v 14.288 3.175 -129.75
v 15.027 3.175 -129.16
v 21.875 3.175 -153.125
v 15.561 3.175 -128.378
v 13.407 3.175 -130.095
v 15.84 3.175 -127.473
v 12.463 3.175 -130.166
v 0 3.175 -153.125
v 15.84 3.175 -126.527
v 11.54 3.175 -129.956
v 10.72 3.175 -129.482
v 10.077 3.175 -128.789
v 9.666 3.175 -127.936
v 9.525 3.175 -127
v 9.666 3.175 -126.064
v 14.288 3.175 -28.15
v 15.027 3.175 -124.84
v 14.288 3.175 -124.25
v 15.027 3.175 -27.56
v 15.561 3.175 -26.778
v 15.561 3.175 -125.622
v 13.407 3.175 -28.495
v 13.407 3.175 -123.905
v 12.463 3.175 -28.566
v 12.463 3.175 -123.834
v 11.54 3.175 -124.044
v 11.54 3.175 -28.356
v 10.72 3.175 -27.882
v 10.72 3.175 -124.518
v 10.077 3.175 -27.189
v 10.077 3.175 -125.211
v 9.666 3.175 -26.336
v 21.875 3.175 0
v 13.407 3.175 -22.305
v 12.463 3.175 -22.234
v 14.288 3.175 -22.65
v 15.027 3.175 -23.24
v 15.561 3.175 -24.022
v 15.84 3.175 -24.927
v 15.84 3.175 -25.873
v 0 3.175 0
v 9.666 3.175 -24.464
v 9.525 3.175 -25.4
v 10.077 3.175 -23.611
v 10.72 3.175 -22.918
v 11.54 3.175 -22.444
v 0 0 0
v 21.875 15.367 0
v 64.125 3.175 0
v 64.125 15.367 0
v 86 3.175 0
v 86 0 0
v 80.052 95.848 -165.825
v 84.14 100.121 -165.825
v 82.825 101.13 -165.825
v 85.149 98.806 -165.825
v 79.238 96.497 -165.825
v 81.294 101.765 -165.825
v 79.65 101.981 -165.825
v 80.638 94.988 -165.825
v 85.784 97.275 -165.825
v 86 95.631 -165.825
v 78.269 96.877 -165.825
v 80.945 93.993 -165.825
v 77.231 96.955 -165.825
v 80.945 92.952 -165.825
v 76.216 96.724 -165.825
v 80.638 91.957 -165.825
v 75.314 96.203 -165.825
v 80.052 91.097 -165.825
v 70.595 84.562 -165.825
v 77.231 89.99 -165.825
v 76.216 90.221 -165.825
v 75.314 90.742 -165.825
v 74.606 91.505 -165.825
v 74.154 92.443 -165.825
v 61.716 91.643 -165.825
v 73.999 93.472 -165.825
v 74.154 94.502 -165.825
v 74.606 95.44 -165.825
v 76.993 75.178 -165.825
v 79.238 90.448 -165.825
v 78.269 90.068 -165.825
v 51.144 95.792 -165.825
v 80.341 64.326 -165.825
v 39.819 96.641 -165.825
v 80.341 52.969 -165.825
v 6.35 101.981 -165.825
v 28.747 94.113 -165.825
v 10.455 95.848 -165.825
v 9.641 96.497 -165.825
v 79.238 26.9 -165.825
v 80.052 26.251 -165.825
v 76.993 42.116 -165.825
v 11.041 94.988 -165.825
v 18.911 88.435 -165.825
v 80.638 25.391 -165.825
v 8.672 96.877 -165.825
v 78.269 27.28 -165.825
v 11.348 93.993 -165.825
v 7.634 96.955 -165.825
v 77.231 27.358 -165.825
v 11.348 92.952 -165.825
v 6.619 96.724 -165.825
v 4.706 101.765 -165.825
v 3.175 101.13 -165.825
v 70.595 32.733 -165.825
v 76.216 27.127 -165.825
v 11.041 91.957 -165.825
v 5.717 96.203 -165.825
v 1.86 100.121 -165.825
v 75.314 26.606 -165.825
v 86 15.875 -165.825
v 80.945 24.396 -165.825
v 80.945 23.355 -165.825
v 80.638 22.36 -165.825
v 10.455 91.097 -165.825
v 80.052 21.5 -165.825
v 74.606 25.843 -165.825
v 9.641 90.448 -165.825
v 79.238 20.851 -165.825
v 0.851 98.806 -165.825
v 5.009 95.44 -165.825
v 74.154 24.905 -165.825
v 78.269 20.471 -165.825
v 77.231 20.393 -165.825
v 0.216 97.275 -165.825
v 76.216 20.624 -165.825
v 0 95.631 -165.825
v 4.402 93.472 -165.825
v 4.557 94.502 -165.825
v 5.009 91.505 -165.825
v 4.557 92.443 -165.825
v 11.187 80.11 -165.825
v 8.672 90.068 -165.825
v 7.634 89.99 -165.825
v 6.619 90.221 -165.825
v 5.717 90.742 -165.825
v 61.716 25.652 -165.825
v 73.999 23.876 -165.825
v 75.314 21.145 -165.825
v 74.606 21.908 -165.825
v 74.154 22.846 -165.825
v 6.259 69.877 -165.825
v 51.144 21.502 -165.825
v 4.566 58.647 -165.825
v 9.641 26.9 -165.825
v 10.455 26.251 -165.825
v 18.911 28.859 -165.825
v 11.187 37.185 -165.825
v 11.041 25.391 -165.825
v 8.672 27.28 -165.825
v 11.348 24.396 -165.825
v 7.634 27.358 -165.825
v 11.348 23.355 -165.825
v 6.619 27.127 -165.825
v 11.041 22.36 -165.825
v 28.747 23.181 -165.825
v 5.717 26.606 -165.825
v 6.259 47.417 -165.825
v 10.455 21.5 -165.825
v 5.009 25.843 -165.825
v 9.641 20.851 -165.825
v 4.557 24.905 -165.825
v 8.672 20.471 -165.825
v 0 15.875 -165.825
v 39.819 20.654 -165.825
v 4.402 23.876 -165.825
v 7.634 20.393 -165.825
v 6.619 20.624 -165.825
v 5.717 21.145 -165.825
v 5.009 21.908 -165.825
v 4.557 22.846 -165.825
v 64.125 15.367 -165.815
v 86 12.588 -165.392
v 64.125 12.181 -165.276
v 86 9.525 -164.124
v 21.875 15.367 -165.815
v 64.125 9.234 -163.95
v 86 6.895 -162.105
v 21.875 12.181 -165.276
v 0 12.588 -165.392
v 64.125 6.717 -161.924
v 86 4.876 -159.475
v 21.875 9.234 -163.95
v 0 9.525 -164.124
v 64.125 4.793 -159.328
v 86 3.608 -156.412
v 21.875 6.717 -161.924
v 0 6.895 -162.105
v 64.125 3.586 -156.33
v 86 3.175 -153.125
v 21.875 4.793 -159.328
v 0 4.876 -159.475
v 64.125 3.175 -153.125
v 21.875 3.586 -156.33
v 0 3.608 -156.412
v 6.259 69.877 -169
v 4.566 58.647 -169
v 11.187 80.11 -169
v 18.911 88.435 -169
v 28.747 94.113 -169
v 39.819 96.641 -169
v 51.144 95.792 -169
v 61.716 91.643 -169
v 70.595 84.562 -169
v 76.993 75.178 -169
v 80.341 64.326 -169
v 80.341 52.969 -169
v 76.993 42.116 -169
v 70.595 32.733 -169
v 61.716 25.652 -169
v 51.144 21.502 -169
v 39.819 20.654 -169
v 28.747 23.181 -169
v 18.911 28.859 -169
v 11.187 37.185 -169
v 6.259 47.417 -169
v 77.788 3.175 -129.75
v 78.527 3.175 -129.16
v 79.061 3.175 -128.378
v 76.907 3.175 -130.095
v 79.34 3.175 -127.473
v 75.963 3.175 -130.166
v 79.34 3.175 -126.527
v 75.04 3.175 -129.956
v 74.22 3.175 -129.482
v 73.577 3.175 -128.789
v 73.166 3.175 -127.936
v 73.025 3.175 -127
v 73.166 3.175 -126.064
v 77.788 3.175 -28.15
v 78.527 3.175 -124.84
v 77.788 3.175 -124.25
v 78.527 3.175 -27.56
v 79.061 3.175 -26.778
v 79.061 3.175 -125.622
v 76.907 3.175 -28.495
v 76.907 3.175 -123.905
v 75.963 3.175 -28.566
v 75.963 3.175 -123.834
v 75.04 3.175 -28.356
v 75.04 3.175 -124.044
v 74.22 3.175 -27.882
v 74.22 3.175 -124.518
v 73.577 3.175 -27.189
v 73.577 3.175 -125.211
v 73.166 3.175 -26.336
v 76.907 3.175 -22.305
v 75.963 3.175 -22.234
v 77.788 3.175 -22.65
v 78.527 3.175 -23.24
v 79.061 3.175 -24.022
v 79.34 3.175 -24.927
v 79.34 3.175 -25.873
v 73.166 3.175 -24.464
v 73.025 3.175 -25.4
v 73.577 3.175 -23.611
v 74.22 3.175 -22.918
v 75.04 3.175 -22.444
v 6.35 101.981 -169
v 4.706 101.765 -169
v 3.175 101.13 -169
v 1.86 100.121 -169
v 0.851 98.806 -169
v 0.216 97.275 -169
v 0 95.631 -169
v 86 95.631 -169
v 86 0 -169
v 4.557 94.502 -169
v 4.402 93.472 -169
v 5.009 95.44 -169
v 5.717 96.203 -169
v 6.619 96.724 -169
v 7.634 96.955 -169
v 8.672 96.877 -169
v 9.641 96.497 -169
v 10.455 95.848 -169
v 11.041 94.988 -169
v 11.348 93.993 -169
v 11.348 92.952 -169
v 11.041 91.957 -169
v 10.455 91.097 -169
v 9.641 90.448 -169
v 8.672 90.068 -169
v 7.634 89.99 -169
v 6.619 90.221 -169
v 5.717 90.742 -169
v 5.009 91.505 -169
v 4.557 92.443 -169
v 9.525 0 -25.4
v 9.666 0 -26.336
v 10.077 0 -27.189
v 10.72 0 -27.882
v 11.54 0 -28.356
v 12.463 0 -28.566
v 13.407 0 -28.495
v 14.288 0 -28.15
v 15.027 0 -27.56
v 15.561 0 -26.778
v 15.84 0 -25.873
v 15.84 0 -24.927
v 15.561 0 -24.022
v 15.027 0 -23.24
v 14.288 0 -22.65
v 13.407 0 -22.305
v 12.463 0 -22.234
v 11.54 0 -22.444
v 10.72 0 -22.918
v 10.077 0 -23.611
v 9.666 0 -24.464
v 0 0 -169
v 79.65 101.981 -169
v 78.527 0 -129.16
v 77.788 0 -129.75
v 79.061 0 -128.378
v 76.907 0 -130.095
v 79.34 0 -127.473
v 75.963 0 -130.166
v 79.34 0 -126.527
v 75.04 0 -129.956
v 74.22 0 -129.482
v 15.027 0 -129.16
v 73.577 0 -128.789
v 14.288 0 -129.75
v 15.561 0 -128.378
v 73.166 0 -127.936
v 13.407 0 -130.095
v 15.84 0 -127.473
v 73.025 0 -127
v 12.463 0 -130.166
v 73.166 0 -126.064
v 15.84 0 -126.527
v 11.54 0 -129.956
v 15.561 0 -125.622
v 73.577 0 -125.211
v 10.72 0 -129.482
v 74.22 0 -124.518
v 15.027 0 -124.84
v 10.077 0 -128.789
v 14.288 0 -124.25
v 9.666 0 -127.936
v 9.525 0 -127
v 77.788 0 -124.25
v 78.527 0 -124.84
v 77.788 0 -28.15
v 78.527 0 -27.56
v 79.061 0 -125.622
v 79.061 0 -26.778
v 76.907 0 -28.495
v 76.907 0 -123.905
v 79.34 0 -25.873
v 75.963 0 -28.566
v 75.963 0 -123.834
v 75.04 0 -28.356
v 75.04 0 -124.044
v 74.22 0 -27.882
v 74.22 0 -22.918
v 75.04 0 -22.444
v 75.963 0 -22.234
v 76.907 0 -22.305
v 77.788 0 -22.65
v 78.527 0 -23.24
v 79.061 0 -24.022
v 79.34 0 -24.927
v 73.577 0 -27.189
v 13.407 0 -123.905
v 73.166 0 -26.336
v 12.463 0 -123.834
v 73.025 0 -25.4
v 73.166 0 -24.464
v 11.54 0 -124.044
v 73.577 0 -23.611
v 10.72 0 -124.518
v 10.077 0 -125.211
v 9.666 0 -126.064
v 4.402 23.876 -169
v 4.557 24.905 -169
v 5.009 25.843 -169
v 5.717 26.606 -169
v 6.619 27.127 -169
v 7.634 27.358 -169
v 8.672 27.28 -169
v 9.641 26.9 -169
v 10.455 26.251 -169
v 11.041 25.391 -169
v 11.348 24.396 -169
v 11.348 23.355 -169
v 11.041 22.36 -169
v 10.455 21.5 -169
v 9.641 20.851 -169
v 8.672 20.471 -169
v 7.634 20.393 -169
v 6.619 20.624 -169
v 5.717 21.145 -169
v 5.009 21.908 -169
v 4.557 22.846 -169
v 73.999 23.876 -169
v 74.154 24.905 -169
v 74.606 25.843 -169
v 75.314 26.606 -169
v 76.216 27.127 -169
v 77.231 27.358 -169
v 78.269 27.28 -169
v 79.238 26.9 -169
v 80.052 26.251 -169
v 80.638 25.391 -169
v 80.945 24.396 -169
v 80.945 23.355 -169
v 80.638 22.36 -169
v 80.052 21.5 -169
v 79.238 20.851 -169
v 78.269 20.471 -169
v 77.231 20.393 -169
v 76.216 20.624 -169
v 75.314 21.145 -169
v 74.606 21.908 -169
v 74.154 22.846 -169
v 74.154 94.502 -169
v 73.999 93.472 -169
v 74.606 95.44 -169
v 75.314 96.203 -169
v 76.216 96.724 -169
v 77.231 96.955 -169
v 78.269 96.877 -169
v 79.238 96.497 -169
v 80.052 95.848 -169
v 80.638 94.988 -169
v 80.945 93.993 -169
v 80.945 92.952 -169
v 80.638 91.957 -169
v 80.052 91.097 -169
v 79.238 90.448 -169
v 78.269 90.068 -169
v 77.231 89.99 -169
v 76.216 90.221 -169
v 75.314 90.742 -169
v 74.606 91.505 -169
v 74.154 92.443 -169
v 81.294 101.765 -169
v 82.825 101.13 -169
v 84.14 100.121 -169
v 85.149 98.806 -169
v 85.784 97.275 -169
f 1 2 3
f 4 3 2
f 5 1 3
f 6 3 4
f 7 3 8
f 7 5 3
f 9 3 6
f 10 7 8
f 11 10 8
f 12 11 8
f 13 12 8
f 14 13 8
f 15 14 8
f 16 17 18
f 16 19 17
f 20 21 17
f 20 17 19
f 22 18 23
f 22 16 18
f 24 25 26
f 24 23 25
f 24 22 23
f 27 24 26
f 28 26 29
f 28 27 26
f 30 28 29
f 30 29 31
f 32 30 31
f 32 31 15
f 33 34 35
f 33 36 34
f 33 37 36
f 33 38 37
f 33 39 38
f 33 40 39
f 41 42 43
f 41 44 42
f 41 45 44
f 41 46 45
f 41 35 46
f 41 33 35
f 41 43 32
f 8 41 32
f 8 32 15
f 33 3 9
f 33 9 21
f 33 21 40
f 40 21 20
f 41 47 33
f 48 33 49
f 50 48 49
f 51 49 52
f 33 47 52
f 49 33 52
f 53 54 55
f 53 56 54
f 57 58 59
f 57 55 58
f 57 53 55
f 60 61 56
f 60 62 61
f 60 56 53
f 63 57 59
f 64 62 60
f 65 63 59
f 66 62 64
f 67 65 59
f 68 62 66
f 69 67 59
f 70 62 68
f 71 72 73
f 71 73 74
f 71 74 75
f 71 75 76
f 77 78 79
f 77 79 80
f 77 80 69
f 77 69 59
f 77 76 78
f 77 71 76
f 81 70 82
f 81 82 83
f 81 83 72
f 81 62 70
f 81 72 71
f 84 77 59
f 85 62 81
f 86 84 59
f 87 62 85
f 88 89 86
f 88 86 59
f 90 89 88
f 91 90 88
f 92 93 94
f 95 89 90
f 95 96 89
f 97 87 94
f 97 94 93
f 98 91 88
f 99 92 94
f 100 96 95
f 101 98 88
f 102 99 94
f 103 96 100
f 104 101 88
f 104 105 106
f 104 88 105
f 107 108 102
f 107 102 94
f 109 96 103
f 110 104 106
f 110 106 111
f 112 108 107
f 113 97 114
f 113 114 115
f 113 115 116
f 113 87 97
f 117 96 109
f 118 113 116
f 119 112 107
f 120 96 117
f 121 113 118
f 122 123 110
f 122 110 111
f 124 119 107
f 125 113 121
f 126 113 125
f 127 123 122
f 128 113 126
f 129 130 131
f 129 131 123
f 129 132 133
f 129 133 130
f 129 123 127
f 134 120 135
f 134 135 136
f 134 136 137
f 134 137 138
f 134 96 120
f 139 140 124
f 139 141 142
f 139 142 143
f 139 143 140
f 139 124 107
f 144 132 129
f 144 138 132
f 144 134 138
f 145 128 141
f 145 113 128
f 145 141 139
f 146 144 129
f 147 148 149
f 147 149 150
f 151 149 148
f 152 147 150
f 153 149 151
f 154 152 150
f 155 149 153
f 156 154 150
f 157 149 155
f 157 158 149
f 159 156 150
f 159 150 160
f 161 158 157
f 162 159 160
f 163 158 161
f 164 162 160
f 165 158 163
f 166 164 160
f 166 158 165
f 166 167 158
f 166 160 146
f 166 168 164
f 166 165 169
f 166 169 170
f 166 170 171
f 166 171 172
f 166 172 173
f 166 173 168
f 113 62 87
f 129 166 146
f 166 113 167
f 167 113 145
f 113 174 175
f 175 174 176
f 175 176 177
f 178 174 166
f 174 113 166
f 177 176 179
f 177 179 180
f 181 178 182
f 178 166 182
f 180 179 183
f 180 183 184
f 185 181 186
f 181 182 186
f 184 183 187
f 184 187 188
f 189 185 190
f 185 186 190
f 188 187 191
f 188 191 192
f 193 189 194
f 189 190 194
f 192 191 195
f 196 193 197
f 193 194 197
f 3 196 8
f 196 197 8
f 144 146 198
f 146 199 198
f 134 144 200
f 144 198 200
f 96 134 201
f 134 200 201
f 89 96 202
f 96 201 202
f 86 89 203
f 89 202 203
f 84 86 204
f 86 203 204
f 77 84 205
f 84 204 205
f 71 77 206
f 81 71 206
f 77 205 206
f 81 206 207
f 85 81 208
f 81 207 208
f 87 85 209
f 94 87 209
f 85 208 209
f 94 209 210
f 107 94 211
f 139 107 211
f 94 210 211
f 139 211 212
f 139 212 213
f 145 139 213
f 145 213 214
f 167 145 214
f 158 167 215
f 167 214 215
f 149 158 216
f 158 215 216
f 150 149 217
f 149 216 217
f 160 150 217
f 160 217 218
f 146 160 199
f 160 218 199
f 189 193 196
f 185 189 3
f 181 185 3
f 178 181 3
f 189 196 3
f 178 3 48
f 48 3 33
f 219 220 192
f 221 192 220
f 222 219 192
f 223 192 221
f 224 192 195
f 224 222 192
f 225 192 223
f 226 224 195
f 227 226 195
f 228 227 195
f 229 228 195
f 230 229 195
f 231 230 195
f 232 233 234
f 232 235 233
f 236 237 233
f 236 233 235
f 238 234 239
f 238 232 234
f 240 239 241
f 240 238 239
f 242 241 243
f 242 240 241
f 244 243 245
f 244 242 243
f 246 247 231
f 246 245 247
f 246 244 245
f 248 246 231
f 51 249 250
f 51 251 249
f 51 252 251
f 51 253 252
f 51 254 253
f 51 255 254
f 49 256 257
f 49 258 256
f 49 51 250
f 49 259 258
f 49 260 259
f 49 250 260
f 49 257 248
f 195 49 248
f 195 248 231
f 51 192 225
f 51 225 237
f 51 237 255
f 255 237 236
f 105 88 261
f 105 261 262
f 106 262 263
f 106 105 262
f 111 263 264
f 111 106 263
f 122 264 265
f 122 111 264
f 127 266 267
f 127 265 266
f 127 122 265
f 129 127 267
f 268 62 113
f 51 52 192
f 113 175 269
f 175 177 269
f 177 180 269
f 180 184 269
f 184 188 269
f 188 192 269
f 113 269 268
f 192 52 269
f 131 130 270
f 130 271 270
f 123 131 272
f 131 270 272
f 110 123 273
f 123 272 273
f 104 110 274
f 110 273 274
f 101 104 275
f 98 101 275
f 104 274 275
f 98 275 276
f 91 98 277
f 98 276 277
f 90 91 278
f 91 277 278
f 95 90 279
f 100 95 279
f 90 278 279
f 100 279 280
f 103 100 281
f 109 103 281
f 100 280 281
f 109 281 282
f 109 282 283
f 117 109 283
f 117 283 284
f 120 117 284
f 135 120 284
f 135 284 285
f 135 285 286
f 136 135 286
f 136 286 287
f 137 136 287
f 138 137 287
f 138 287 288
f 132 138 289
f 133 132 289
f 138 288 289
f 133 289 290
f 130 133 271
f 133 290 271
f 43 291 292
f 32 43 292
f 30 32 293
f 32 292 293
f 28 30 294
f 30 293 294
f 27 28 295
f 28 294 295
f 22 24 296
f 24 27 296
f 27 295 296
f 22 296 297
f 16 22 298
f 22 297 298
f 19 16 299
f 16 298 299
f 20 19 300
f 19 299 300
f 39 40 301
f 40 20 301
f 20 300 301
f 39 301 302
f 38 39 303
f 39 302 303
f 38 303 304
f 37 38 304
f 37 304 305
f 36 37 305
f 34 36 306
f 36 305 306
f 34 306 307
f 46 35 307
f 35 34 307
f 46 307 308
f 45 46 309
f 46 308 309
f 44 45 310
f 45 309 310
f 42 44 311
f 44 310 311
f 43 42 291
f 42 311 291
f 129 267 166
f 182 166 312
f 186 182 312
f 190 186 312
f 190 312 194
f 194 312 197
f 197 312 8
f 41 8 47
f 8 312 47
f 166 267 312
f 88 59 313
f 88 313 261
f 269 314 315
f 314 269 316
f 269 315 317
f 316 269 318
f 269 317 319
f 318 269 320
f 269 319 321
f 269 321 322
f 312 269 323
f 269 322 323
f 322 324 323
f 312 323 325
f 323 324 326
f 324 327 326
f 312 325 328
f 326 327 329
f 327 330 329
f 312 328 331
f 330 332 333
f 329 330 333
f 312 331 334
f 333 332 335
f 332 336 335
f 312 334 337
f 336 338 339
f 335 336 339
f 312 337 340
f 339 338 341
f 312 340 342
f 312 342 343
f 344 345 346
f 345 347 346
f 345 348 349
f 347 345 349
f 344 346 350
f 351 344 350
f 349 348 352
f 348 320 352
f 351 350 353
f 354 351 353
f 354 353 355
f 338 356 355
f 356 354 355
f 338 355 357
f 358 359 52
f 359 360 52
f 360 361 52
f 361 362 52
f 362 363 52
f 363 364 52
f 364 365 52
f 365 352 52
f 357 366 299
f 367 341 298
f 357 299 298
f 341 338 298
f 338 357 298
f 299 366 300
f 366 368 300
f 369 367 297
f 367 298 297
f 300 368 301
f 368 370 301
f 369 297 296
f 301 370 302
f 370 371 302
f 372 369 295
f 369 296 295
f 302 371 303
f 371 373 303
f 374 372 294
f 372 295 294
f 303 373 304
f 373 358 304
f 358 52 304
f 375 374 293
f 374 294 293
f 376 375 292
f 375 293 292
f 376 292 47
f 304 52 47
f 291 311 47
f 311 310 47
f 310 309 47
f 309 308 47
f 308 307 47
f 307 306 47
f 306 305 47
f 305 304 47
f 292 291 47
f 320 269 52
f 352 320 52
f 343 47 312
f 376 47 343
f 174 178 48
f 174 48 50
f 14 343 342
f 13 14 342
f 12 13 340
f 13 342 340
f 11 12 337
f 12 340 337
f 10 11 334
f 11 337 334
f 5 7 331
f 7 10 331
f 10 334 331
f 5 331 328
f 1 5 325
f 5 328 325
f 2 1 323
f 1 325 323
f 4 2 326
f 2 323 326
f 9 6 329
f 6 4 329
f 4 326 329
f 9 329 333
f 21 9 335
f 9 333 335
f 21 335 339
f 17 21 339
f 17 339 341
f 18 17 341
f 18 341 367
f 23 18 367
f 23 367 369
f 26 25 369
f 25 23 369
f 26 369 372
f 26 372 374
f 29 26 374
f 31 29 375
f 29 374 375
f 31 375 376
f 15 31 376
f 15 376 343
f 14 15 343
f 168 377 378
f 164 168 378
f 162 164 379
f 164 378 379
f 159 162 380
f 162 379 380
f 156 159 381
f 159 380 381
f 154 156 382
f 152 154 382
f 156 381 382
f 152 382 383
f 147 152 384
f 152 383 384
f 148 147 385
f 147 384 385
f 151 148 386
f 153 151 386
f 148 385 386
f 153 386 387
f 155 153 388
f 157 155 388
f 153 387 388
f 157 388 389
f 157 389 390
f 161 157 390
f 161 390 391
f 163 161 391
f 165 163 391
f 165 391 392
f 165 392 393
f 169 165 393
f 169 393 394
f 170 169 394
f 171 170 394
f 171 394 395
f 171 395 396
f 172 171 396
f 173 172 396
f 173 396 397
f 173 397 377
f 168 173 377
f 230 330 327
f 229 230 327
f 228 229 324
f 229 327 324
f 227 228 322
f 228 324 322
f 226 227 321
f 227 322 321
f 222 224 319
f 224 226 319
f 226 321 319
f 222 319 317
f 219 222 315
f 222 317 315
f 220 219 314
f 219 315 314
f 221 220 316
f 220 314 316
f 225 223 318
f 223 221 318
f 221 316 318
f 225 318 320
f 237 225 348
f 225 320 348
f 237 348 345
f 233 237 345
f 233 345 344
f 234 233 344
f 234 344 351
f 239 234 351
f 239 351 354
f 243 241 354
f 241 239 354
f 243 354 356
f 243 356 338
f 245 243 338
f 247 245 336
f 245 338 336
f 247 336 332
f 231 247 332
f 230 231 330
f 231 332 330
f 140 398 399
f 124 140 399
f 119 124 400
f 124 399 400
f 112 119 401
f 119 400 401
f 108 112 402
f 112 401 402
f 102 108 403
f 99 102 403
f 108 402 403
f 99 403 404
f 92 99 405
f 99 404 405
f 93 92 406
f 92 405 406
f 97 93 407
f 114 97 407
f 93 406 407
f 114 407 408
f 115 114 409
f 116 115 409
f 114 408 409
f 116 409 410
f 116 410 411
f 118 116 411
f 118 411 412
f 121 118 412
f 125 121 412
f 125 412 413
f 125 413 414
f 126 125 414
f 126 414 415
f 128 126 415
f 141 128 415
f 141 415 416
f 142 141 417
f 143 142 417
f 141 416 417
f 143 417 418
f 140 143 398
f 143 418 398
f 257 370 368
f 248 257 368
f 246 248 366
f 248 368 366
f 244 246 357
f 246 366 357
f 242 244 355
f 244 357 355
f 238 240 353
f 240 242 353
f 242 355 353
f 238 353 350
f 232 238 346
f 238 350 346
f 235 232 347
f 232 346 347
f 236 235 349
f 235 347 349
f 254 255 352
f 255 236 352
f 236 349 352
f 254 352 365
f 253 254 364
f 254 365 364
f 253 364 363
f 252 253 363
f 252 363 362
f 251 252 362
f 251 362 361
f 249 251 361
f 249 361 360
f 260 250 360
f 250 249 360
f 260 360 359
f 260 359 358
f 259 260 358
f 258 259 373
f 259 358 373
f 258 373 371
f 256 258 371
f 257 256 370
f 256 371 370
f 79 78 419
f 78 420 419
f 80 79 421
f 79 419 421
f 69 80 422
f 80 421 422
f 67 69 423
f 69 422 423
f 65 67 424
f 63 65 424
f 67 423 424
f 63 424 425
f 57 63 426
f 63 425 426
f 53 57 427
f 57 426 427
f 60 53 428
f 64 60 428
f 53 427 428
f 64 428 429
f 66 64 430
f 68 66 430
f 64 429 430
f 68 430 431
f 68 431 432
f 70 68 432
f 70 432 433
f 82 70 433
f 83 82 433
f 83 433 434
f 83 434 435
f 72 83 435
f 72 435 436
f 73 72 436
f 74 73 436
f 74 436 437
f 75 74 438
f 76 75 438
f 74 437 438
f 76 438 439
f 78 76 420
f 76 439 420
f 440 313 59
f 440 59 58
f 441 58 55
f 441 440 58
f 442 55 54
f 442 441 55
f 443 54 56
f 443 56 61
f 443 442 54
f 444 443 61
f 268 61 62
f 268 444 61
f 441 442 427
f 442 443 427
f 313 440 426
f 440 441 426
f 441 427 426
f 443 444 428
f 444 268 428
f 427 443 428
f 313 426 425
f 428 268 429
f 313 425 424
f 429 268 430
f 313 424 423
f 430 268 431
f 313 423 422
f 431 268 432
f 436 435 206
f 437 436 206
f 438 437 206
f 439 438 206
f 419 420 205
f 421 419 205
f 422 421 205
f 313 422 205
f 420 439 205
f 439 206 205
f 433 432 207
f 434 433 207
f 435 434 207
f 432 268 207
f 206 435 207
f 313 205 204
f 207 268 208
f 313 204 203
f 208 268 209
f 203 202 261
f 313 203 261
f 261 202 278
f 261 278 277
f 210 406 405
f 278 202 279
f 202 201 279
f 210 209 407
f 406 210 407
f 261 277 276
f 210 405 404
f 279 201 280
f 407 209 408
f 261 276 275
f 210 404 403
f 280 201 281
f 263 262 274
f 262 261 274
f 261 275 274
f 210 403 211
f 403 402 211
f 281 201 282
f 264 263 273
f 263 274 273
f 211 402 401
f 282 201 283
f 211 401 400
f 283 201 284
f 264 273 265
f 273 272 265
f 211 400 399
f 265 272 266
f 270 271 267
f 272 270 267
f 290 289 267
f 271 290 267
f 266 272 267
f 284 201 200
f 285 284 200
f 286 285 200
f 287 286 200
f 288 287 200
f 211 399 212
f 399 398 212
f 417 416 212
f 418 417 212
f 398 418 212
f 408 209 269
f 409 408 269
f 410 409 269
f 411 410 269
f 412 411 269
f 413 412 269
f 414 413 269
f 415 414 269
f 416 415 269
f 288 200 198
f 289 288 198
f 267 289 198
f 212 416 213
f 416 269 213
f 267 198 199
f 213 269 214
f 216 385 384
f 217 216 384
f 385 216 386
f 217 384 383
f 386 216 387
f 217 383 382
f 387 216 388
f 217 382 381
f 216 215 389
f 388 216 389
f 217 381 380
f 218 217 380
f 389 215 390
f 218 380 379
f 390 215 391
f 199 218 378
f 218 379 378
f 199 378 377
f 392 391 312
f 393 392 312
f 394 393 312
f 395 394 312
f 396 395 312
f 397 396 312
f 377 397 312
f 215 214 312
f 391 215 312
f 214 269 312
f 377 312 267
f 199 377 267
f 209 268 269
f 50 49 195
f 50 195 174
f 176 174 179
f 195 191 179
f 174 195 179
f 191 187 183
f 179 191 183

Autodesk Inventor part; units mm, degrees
ref_plane "YZ Plane" through (0, 0, 0) normal (1, 0, 0) x (0, 1, 0)
ref_plane "XZ Plane" through (0, 0, 0) normal (0, 1, 0) x (-1, 0, 0)
ref_plane "XY Plane" through (0, 0, 0) normal (0, 0, 1) x (1, 0, 0)
sketch "Sketch1" plane through (0, 0, 0) normal (0, 1, 0) x (-1, 0, 0)
  line L0 (0, 0) -> (-86, 0)
  line L1 (-86, 0) -> (-86, -169)
  line L2 (-86, -169) -> (0, -169)
  line L3 (0, -169) -> (0, 0)
  circle A0 centre (-12.7, -25.4) radius 3.175
  circle A1 centre (-12.7, -127) radius 3.175
  circle A2 centre (-76.2, -25.4) radius 3.175
  circle A3 centre (-76.2, -127) radius 3.175
  line L4 (0, -169) -> (-86, -169)
  line L5 (-86, -169) -> (-86, -165.825)
  line L6 (-86, -165.825) -> (0, -165.825)
  line L7 (0, -165.825) -> (0, -169)
  point P0 (0, -165.825)
  dimension "d0" = 6.35
  dimension "d1" = 169
  dimension "d2" = 86
  dimension "d3" = 12.7
  dimension "d4" = 25.4
  dimension "d7" = 101.6
  dimension "d10" = 63.5
  dimension "d31" = 3.175
extrude "Extrusion1" add sketch "Sketch1" along normal blind 3.175 contours L3 L6 L1 L0
sketch "Sketch3" plane through (0, 3.175, 0) normal (0, 1, 0) x (1, 0, 0)
  line L0 (0, 0) -> (86, 0) projected
  line L1 (21.875, 0) -> (64.125, 0)
  line L2 (64.125, 0) -> (64.125, 165.825)
  line L3 (64.125, 165.825) -> (21.875, 165.825)
  line L4 (21.875, 165.825) -> (21.875, 0)
  line L5 (0, 165.825) -> (0, 0) projected
  line L6 (86, 0) -> (86, 165.825) projected
  line L7 (43, 0) -> (43.307, 154.432) construction
  line L8 (86.614, 154.432) -> (0, 154.432) construction
  line L9 (43, 0) -> (43, 165.825) construction
  line L10 (86, 165.825) -> (0, 165.825) projected
  point P0 (64.125, 0)
  dimension "d28" = 42.25
extrude "Extrusion3" add sketch "Sketch3" along normal blind 12.192 contours L4 L3 L2 L0
extrude "Extrusion4" add sketch "Sketch1" along normal blind 101.981 contours L3 L2 L1 L6
sketch "Sketch4" plane through (86, 0, -169) normal (0, 0, -1) x (-1, 0, 0)
  circle A0 centre (43.3338, 58.6472) radius 38.1
  circle A1 centre (8.5085, 93.4725) radius 3.4925
  line L0 (0, 0) -> (0, 101.981) projected
  line L1 (0, 101.981) -> (86, 101.981) projected
  circle A2 centre (78.1055, 93.4725) radius 3.4925
  circle A3 centre (8.5085, 23.8755) radius 3.4925
  circle A4 centre (78.1055, 23.8755) radius 3.4925
  point P0 (86, 0)
  dimension "d34" = 76.2
  dimension "d35" = 6.985
  dimension "d36" = 8.5085
  dimension "d38" = 8.5085
  dimension "d41" = 69.597
  dimension "d44" = 69.597
  dimension "d47" = 43.3338
  dimension "d48" = 43.3338
extrude "Extrusion5" cut sketch "Sketch4" against normal through all
fillet "Fillet1" radius 12.7 2 edges at (75.0625, 3.175, -165.825) (10.9375, 3.175, -165.825)
fillet "Fillet2" radius 6.35 2 edges at (86, 101.981, -167.4125) (0, 101.981, -167.4125)
equation "\"d28\" = 0.25 * d1"
properties part number "MotorStandoff"
